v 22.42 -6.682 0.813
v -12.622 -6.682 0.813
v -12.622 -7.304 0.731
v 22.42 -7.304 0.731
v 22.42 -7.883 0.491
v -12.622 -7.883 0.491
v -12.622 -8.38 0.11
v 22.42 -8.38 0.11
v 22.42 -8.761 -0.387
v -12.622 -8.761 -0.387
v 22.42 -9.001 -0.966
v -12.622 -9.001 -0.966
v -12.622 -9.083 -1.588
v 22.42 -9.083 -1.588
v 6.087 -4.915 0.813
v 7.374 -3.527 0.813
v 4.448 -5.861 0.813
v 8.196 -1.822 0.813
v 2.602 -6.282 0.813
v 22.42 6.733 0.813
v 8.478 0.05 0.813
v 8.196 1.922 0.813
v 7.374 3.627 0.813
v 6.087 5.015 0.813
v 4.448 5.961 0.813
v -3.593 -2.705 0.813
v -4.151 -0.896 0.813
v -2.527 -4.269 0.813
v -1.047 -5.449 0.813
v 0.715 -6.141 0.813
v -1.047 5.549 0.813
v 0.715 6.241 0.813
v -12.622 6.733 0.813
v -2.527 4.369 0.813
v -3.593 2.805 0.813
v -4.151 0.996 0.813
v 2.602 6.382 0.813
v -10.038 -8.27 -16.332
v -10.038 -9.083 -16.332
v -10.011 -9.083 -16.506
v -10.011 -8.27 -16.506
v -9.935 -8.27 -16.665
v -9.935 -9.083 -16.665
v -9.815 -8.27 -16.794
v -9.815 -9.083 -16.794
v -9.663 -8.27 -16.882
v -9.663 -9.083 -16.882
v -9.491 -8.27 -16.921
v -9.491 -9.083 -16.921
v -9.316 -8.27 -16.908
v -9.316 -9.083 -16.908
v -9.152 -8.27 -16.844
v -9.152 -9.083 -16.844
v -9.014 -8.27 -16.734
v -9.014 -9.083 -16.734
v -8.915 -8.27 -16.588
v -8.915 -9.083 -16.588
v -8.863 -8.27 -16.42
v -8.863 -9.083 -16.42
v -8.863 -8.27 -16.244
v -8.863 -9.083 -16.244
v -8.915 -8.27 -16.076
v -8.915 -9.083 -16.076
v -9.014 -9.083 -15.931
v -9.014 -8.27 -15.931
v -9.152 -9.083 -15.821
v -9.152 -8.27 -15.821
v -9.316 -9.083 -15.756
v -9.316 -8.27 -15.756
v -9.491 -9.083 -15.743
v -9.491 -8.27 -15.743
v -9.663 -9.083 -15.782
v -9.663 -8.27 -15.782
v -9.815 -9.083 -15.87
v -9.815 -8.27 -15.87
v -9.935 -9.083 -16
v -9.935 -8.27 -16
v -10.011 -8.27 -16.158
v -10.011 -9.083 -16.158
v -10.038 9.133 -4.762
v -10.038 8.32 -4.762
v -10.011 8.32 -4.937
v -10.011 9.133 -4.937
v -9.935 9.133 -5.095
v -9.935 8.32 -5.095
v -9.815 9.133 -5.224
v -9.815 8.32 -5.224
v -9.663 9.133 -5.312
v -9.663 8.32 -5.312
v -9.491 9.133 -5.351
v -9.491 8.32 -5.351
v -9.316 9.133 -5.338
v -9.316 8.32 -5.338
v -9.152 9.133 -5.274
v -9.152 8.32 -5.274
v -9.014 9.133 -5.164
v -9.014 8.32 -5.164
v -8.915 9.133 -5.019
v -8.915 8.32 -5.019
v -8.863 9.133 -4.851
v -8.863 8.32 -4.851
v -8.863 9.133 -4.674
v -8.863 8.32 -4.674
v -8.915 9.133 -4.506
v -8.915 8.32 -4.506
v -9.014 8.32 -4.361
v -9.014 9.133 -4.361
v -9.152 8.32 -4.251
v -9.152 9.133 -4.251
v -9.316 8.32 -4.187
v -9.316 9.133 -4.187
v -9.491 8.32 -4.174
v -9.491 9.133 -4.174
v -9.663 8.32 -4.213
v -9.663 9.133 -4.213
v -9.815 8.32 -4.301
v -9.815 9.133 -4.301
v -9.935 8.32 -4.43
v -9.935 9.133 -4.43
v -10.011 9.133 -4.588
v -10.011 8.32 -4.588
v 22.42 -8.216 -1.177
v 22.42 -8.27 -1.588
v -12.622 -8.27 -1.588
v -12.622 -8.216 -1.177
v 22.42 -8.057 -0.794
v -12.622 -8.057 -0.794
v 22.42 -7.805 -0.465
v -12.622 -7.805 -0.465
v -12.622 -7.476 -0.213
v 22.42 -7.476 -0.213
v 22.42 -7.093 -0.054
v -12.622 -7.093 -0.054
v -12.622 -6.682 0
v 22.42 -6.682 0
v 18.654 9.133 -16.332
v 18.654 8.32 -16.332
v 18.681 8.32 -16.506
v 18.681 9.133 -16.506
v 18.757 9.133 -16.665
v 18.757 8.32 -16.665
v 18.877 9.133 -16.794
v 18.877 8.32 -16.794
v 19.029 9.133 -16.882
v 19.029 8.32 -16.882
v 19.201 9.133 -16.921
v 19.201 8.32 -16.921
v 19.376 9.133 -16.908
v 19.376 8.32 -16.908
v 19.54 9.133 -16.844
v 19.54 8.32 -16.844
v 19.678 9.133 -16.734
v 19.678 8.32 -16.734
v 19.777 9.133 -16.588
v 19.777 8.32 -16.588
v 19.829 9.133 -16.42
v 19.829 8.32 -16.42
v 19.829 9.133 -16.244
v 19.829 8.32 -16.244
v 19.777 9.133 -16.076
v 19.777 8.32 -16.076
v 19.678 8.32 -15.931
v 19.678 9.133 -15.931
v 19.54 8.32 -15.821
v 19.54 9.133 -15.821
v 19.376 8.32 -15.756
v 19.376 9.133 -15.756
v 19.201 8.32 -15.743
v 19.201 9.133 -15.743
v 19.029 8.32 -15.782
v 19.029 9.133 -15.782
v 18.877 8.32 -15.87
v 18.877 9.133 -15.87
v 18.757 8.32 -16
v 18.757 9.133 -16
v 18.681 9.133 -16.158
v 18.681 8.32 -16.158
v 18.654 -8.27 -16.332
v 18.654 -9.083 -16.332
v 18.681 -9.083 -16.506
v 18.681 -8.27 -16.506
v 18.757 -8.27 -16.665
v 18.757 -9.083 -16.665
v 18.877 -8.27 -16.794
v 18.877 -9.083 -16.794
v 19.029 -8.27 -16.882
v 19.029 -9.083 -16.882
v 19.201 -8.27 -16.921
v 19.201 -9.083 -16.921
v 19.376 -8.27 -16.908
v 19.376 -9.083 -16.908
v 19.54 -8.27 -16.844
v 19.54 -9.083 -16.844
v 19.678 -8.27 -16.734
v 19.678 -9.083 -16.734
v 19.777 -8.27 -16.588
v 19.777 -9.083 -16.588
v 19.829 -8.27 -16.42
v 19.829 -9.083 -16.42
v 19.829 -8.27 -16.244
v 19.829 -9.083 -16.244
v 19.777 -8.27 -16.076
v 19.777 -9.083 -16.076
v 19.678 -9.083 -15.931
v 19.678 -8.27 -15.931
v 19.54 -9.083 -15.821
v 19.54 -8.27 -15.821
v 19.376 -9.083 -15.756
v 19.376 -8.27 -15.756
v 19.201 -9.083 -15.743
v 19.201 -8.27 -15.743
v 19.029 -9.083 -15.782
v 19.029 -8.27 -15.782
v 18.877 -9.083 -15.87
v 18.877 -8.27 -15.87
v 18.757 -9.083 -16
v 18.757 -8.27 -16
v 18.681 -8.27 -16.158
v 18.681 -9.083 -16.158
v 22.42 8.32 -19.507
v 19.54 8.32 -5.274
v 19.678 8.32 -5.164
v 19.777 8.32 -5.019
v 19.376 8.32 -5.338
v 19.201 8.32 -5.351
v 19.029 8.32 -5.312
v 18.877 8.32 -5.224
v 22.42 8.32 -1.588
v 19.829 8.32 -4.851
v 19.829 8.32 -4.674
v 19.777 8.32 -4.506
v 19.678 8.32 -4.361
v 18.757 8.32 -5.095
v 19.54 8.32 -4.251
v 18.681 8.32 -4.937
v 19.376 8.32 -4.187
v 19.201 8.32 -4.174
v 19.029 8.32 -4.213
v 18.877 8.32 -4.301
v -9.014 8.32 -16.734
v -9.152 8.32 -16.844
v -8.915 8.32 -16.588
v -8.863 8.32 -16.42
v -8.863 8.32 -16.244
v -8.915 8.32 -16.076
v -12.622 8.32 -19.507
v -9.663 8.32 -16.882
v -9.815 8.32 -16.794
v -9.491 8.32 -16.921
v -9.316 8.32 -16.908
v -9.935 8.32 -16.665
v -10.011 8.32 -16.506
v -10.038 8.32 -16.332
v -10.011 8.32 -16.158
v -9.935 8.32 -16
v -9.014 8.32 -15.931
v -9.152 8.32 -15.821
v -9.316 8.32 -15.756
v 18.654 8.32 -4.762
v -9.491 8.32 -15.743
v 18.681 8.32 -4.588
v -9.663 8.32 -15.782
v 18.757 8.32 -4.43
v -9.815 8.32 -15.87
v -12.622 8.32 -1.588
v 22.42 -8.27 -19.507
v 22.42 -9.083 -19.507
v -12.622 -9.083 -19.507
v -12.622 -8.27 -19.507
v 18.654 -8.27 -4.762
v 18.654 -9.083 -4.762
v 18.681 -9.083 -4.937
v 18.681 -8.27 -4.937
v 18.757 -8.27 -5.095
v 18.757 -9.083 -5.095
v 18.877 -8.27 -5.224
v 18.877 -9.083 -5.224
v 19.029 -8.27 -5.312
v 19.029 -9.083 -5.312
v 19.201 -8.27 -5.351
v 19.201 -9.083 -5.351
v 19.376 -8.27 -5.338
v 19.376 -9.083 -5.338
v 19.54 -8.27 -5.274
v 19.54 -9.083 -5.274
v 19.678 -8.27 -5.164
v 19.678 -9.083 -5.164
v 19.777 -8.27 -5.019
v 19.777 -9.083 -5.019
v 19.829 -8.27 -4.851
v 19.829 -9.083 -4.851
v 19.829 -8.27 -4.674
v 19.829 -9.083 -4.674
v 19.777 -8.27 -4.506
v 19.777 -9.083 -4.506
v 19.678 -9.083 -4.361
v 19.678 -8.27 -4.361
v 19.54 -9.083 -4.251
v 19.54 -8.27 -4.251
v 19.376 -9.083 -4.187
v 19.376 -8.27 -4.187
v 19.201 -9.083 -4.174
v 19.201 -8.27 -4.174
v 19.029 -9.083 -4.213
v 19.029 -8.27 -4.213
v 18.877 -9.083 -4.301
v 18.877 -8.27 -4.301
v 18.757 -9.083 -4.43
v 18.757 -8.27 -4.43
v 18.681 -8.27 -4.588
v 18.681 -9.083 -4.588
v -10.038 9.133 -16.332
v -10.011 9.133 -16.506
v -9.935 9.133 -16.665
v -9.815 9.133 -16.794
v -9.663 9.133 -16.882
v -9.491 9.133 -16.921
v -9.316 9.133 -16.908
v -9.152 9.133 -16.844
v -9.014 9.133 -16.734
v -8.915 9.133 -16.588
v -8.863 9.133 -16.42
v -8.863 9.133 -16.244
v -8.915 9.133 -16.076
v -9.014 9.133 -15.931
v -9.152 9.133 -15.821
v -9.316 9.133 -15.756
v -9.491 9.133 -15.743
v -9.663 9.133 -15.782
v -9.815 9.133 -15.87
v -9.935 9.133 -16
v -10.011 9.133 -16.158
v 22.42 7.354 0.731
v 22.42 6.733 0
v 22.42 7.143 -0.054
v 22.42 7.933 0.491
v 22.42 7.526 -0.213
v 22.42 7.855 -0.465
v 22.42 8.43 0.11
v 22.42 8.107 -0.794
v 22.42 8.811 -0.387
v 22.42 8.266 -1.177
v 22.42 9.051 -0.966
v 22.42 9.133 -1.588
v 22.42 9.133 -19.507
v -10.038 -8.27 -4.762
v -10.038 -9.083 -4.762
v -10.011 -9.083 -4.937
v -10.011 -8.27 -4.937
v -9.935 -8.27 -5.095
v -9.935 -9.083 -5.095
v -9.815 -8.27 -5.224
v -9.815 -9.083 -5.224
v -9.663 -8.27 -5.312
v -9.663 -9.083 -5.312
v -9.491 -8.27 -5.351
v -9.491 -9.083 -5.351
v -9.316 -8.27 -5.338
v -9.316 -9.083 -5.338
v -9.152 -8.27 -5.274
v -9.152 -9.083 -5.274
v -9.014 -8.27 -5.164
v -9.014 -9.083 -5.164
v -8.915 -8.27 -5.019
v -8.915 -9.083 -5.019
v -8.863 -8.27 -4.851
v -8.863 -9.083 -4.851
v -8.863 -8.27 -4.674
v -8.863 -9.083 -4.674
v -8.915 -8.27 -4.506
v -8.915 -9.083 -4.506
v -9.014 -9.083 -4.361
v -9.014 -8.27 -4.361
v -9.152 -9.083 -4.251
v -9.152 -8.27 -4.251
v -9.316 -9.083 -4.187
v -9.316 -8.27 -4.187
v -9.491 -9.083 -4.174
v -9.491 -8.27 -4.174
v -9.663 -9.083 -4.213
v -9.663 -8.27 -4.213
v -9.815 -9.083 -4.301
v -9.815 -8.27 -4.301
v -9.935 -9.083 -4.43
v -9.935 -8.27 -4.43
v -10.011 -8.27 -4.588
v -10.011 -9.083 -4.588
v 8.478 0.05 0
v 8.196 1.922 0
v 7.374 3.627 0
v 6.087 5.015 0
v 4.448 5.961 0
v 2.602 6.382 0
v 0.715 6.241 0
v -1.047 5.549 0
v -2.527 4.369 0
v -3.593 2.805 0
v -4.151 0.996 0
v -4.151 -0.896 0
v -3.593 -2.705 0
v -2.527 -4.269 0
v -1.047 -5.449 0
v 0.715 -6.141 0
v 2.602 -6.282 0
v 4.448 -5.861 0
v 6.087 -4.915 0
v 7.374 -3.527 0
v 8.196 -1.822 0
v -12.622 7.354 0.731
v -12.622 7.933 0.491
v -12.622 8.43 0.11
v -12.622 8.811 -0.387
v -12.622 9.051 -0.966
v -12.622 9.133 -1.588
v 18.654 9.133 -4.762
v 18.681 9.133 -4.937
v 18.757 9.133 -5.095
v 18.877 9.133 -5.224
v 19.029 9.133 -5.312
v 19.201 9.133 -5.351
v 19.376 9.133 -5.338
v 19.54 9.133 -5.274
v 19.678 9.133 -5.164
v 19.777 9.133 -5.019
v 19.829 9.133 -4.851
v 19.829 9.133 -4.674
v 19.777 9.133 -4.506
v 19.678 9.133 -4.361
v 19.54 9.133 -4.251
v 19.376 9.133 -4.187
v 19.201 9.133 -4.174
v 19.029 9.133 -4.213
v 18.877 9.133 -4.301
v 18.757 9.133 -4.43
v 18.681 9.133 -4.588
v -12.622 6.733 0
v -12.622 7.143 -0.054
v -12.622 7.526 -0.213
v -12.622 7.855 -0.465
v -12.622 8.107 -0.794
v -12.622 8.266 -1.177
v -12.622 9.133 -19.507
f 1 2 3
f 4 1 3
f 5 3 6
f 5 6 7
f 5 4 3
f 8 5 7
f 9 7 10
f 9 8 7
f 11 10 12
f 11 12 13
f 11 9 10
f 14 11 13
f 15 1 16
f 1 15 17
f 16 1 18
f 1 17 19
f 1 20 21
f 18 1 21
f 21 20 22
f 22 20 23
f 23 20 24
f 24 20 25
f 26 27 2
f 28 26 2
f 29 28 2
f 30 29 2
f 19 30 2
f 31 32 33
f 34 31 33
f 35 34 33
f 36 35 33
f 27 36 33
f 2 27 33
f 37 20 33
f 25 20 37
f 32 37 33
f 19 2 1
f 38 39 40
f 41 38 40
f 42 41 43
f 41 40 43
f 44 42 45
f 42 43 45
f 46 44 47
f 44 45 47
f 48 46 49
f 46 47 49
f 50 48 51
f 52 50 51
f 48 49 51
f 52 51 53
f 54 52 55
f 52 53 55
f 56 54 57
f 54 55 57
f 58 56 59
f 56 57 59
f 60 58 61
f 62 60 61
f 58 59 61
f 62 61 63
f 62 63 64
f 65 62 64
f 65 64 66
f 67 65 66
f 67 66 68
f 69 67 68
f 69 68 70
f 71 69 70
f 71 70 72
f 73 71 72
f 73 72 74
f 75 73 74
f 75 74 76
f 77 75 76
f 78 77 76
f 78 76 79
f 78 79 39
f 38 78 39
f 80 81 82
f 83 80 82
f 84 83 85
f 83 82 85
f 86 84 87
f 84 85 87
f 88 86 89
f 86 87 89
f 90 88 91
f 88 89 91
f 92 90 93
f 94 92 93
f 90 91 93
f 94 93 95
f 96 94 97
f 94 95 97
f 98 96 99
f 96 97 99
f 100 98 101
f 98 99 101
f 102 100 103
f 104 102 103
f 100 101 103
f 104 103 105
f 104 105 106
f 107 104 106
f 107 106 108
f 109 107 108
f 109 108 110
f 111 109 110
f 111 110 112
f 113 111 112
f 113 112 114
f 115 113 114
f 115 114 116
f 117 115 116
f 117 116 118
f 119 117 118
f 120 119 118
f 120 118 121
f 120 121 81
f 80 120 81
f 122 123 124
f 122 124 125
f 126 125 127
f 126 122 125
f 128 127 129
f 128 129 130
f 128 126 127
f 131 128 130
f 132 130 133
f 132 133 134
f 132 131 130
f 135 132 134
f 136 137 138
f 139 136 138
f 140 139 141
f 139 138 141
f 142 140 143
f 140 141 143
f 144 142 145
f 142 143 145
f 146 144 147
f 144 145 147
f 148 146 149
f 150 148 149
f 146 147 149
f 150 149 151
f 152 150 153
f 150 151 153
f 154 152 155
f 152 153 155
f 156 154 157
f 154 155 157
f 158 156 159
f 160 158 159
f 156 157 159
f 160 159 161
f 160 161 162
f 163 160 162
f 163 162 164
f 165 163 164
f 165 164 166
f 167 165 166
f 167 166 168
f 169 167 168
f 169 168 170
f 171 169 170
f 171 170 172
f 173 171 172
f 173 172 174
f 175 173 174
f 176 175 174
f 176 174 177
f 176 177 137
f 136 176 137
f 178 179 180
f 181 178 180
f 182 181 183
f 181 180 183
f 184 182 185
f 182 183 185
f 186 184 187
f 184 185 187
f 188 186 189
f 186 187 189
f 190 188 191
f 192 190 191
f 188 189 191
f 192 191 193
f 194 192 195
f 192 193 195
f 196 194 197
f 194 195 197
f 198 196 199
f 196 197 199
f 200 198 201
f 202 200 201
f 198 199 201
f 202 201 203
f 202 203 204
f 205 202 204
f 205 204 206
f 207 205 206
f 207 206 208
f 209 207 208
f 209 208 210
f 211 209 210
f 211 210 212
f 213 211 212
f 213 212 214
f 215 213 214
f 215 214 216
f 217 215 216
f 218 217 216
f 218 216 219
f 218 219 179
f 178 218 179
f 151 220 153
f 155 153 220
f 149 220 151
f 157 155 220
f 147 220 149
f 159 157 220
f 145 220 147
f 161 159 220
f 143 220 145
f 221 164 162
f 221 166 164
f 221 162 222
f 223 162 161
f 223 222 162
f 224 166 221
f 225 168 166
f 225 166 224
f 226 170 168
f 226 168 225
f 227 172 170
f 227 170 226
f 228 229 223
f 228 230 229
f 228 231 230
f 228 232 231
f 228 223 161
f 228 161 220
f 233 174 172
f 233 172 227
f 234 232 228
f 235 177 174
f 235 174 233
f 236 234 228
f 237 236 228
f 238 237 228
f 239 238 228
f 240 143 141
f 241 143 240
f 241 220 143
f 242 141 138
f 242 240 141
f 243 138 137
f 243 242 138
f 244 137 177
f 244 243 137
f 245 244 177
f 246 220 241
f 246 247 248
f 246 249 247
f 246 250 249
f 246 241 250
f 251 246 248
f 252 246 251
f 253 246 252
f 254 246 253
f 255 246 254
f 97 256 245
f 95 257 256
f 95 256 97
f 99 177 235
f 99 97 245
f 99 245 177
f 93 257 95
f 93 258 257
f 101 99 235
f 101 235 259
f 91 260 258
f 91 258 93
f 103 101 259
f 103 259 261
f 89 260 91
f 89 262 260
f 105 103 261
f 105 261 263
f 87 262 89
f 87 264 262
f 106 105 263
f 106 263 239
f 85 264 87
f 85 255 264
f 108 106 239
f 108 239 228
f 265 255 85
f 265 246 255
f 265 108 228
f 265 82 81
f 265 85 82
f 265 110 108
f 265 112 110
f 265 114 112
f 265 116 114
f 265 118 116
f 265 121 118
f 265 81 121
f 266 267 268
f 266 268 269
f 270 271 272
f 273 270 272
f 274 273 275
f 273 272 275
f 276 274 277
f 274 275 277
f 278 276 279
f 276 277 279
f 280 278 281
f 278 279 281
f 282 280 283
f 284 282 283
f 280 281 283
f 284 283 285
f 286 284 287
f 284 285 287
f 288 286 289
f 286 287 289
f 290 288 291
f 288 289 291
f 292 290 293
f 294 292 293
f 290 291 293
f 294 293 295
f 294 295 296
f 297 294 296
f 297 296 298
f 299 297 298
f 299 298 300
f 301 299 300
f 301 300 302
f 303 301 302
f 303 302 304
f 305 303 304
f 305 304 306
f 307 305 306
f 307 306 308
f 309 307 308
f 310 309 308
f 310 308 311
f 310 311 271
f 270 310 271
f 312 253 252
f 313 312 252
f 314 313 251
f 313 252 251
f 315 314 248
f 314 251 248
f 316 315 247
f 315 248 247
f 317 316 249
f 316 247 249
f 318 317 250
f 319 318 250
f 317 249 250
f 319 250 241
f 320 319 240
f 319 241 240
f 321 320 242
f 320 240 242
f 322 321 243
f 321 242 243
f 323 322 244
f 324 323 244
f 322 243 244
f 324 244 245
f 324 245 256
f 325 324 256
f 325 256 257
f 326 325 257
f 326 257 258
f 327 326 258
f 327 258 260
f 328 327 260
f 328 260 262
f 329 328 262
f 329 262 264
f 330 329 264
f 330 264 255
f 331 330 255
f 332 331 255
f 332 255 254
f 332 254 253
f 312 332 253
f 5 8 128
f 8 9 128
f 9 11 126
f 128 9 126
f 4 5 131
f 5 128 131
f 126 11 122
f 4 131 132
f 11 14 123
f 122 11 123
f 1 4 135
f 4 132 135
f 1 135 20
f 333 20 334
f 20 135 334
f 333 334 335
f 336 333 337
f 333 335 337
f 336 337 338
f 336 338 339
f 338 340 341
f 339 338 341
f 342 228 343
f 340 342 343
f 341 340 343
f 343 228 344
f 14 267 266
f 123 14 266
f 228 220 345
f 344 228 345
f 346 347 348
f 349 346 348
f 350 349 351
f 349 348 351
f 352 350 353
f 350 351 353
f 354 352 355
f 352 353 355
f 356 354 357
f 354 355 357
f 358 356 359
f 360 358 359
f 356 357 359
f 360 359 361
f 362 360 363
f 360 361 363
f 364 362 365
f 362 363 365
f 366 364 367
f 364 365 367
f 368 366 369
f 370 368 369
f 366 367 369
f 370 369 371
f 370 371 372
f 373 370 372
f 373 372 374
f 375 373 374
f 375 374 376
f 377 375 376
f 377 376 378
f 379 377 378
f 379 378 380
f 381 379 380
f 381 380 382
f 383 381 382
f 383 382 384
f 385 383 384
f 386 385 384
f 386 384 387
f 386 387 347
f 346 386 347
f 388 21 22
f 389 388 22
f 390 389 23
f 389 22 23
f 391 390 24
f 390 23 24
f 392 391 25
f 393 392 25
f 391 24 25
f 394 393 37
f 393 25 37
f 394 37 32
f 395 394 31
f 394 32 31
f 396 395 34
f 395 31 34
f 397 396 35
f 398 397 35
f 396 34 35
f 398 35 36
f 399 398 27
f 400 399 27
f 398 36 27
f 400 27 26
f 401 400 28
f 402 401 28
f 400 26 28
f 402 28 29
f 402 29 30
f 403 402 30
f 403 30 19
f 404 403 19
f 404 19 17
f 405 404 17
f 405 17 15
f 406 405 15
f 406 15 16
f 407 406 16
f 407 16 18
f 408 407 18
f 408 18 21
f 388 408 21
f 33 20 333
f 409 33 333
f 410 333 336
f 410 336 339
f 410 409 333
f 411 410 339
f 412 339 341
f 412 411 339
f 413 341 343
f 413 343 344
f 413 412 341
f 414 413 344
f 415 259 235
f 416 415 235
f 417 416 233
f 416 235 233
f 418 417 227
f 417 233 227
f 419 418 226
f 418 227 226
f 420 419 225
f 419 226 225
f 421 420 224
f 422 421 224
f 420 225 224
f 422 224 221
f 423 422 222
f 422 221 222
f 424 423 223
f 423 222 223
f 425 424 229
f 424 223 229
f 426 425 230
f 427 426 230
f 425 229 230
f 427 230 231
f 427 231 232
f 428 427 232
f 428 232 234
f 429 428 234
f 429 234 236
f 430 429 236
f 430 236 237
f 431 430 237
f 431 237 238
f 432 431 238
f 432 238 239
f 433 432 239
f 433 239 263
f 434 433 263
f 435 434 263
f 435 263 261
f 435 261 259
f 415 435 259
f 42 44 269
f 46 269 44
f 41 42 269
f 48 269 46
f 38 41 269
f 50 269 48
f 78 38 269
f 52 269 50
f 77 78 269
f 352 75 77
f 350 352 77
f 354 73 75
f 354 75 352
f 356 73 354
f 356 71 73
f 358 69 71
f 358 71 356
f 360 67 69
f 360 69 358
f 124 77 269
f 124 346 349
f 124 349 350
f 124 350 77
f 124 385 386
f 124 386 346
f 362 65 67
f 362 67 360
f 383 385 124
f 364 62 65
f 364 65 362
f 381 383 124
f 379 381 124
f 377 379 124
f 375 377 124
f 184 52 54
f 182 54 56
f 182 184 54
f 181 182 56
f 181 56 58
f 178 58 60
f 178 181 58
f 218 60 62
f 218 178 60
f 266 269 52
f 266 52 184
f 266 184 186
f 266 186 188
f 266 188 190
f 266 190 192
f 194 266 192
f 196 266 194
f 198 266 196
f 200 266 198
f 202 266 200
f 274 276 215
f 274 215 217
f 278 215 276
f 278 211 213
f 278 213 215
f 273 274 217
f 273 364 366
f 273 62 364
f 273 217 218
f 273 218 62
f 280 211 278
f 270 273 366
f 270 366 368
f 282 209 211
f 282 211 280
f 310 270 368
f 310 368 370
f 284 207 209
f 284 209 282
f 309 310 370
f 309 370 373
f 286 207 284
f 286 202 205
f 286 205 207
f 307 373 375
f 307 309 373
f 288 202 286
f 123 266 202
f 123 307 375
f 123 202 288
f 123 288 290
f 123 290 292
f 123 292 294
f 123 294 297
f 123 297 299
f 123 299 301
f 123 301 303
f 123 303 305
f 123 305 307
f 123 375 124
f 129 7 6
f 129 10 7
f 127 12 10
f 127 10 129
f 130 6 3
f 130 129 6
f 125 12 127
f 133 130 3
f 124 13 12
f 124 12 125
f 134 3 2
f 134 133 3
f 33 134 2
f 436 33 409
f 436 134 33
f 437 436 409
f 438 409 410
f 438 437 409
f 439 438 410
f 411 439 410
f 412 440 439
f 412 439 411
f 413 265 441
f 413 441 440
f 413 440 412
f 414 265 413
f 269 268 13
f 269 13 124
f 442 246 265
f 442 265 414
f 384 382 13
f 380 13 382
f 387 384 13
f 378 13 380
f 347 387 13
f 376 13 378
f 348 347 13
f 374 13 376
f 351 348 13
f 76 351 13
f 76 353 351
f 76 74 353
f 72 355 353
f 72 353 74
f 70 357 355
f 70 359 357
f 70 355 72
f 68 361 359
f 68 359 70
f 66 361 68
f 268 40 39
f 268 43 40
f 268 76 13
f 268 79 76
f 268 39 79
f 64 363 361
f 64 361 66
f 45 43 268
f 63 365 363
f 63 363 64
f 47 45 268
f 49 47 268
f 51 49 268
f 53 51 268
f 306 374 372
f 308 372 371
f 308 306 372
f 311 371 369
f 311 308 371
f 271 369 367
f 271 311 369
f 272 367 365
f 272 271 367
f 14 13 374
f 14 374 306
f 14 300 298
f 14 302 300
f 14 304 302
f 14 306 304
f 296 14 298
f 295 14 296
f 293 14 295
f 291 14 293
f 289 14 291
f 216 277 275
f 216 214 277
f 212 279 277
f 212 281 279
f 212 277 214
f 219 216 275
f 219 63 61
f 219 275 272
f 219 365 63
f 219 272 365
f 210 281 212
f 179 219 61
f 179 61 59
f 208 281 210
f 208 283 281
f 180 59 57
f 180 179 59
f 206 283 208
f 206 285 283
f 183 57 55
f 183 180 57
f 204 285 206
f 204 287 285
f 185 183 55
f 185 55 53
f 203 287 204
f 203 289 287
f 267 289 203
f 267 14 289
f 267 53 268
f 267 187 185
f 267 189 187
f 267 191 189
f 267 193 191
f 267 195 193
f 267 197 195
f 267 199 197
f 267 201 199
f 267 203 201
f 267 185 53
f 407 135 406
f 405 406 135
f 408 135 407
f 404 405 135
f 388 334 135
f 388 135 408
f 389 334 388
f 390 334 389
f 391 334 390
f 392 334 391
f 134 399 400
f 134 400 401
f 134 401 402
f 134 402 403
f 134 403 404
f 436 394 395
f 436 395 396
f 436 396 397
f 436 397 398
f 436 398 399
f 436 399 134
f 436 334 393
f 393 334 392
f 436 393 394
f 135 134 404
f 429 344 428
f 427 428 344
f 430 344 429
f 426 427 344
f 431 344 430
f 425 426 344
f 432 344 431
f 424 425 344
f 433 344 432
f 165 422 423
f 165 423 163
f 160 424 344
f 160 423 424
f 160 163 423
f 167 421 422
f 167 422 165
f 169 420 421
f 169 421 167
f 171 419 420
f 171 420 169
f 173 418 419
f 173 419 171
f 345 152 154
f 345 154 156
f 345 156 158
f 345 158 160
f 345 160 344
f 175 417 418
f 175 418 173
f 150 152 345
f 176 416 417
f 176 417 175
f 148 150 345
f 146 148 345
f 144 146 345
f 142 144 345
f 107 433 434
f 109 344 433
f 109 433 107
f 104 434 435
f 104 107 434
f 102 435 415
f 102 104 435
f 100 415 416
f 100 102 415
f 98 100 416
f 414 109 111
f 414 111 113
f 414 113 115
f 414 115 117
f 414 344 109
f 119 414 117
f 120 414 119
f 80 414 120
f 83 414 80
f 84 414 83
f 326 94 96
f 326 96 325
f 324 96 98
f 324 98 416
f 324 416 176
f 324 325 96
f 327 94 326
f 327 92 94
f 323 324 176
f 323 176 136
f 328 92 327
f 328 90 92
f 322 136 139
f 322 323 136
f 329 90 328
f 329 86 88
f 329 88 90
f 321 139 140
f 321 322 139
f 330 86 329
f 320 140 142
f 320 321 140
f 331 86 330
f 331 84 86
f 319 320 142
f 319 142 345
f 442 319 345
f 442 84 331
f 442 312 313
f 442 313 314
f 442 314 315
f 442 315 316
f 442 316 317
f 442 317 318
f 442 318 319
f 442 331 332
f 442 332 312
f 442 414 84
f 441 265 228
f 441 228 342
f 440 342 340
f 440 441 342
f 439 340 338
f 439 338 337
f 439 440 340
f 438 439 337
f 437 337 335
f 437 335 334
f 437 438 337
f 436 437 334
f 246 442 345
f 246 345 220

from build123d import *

# Parameters (mm, degrees)
BASE_FLANGE1_DEPTH             = 0.8128
EDGE_FLANGE1_STRIP_W           = 6.4262
EDGE_FLANGE1_STRIP_H           = 0.8128
EDGE_FLANGE1_STRIP_CUT_DEPTH   = 35.042145822
EDGE_FLANGE1_STRIP_2_W         = 6.4262
EDGE_FLANGE1_STRIP_2_H         = 0.8128
EDGE_FLANGE1_STRIP_CUT_2_DEPTH = 35.042145822
EDGE_FLANGE1_DEPTH             = 35.042145822
EDGE_FLANGE1_BEND_DEPTH        = 35.042145822
SKETCH12_R                     = 6.35
CUT_EXTRUDE1_DEPTH             = 32.60643662
F_56_0_0465_DIAMETER_HOLE1_D   = 1.1811


# Sheet-metal steps are written as plain solids
with BuildPart() as part:
    # Sketch1 → Base-Flange1 (new body)
    with BuildSketch(Plane.XY):
        Polygon((-12.622145822, 8.32), (16.07, 8.32), (22.42, 8.32), (22.42, -8.27), (16.07, -8.27), (-12.622145822, -8.27), align=None)
    extrude(amount=BASE_FLANGE1_DEPTH)

    # Edge-Flange1 strip (across the edge) → Edge-Flange1 strip cut (cut)
    with BuildSketch(Plane(origin=(22.42, -8.27, 0), x_dir=(0, 1, 0), z_dir=(-1, 0, 0))):
        with Locations((-1.6256, -0.4064)):
            Rectangle(EDGE_FLANGE1_STRIP_W, EDGE_FLANGE1_STRIP_H)
    extrude(amount=EDGE_FLANGE1_STRIP_CUT_DEPTH, mode=Mode.SUBTRACT)

    # Edge-Flange1 strip 2 (across the edge) → Edge-Flange1 strip cut 2 (cut)
    with BuildSketch(Plane(origin=(-12.622145822, 8.32, 0), x_dir=(0, -1, 0), z_dir=(1, 0, 0))):
        with Locations((-1.6256, -0.4064)):
            Rectangle(EDGE_FLANGE1_STRIP_2_W, EDGE_FLANGE1_STRIP_2_H)
    extrude(amount=EDGE_FLANGE1_STRIP_CUT_2_DEPTH, mode=Mode.SUBTRACT)

    # Edge-Flange1 section (across the edge) → Edge-Flange1 (add)
    with BuildSketch(Plane(origin=(22.42, -8.27, 0), x_dir=(0, 1, 0), z_dir=(-1, 0, 0))):
        with BuildLine():
            Line((-0.8128, 1.5875), (-0.8128, 19.5072))
            Line((-0.8128, 19.5072), (0, 19.5072))
            Line((0, 19.5072), (0, 1.5875))
            ThreePointArc((0, 1.5875), (0.464967985, 0.464967985), (1.5875, 0))
            Line((1.5875, 0), (1.5875, -0.8128))
            ThreePointArc((1.5875, -0.8128), (-0.109768407, -0.109768407), (-0.8128, 1.5875))
        make_face()
    extrude(amount=EDGE_FLANGE1_DEPTH)

    # Edge-Flange1 section 2 (across the edge) → Edge-Flange1 bend (add)
    with BuildSketch(Plane(origin=(-12.622145822, 8.32, 0), x_dir=(0, -1, 0), z_dir=(1, 0, 0))):
        with BuildLine():
            Line((-0.8128, 1.5875), (-0.8128, 19.5072))
            Line((-0.8128, 19.5072), (0, 19.5072))
            Line((0, 19.5072), (0, 1.5875))
            ThreePointArc((0, 1.5875), (0.464967985, 0.464967985), (1.5875, 0))
            Line((1.5875, 0), (1.5875, -0.8128))
            ThreePointArc((1.5875, -0.8128), (-0.109768407, -0.109768407), (-0.8128, 1.5875))
        make_face()
    extrude(amount=EDGE_FLANGE1_BEND_DEPTH)

    # Sketch12 → Cut-Extrude1 (cut, through all)
    with BuildSketch(Plane.XY.offset(0.8128)):
        with Locations((2.127854178, 0.05)):
            Circle(SKETCH12_R)
    extrude(amount=-CUT_EXTRUDE1_DEPTH, mode=Mode.SUBTRACT)

    # #56 (0.0465) Diameter Hole1 (through all)
    with Locations(Plane(origin=(0, 9.1328, 0), x_dir=(1, 0, 0), z_dir=(0, 1, 0))):
        with Locations((19.245, 4.7625), (19.245, 16.3322), (-9.447145822, 16.3322), (-9.447145822, 4.7625)):
            Hole(F_56_0_0465_DIAMETER_HOLE1_D / 2)


solid = part.part
